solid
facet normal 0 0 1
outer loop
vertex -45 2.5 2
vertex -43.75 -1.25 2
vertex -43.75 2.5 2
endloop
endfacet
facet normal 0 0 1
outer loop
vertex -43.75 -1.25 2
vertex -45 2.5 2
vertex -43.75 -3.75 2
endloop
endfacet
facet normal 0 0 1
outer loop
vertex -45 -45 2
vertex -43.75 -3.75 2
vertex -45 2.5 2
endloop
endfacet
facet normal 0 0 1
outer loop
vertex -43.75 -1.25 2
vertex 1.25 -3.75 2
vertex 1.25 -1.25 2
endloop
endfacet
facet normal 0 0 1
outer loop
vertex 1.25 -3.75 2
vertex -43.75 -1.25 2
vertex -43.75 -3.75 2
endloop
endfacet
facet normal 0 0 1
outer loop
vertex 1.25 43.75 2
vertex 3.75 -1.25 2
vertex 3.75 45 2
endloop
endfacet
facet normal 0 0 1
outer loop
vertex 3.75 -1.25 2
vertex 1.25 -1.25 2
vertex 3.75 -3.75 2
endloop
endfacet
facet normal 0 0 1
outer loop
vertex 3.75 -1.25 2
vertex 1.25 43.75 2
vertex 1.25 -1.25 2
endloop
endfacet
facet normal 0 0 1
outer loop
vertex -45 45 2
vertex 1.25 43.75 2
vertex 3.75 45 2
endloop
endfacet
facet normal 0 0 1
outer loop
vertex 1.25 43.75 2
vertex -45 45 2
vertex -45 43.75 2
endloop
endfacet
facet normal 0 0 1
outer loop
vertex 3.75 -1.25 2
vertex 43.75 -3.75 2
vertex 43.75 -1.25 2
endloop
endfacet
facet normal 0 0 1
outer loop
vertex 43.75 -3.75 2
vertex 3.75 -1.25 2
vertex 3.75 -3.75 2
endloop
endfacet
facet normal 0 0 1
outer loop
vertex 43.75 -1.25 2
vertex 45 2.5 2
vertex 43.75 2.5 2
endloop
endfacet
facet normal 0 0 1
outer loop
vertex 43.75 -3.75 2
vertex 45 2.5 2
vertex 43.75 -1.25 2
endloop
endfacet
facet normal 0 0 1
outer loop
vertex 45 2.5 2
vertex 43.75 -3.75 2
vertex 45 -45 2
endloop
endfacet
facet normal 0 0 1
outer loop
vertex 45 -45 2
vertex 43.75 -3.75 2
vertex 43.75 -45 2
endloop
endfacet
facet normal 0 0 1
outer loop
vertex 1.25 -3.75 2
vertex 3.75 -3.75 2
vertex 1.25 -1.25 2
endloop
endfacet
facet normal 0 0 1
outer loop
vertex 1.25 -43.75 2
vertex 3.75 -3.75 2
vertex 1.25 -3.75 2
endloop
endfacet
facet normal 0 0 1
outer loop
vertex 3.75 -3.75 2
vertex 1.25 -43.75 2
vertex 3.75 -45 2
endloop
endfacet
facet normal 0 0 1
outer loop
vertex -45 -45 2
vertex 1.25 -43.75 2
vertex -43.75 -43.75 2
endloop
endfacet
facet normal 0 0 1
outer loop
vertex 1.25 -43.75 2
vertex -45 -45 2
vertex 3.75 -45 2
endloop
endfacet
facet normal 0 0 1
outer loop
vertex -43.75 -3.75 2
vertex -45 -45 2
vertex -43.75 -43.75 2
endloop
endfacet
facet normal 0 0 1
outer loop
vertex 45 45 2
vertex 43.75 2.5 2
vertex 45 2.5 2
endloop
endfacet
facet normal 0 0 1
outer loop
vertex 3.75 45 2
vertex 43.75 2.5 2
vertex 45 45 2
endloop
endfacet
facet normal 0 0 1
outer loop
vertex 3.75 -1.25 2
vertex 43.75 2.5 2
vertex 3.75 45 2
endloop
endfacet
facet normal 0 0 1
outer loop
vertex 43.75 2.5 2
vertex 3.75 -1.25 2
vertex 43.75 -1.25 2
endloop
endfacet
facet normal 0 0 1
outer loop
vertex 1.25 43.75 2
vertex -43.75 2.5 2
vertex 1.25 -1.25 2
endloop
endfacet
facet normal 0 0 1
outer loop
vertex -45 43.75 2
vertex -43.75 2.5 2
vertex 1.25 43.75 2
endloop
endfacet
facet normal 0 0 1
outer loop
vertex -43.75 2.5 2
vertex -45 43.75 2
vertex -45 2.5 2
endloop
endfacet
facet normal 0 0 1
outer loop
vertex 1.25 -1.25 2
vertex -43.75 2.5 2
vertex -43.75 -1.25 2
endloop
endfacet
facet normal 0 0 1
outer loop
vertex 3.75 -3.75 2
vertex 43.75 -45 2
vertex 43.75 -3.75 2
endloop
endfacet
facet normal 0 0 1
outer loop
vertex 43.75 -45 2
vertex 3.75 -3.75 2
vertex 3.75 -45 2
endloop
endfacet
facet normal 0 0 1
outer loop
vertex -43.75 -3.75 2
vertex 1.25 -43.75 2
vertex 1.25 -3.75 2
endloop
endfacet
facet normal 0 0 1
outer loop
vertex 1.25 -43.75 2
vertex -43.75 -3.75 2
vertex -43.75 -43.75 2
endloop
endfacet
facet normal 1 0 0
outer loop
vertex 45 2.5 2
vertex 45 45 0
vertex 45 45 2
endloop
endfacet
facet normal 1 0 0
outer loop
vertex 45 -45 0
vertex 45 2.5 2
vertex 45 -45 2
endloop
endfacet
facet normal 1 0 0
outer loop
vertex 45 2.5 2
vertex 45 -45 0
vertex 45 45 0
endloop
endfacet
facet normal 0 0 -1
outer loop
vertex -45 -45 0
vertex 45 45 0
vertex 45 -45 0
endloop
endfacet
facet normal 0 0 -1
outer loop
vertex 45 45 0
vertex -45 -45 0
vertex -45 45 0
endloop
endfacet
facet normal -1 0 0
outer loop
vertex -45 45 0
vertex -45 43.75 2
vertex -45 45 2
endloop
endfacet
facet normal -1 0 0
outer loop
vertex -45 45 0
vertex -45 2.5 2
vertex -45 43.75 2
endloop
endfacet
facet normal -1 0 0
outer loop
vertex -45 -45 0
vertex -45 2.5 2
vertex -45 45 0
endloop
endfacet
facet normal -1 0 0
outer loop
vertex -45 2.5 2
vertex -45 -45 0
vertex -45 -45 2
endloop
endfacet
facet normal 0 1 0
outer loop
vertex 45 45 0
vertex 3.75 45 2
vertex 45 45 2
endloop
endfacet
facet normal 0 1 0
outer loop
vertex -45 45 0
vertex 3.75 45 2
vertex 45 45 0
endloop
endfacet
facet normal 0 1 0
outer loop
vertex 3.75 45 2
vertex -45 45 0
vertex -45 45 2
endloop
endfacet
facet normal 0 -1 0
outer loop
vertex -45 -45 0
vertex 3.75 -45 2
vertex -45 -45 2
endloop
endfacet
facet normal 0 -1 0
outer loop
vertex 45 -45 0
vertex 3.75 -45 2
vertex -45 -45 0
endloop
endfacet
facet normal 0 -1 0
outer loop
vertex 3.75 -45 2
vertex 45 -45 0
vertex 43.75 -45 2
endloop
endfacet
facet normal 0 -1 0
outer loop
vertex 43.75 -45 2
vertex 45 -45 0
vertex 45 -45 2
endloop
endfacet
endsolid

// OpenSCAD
// Built by bench/smallmodels/features/compiler.py from a list of features.
$fn = 64;
difference() {
  union() {
    translate([0, 0, 0]) translate([-45, -45, 0]) cube([90, 90, 2]);
  }
  union() {
    translate([0, 0, -3.5]) rotate([0, 0, 0]) translate([-35.75, -35.75, 0]) cube([71.5, 71.5, 2]);
    translate([-42.5, -135, 2]) rotate([0, 0, 0]) translate([-45, -1.25, 0]) cube([90, 2.5, 40]);
    translate([-42.5, -45, 2]) rotate([0, 0, 0]) translate([-45, -1.25, 0]) cube([90, 2.5, 40]);
    translate([-42.5, 45, 2]) rotate([0, 0, 0]) translate([-45, -1.25, 0]) cube([90, 2.5, 40]);
    translate([-42.5, 135, 2]) rotate([0, 0, 0]) translate([-45, -1.25, 0]) cube([90, 2.5, 40]);
    translate([-135, -42.5, 2]) rotate([0, 0, 0]) translate([-1.25, -45, 0]) cube([2.5, 90, 40]);
    translate([-45, -42.5, 2]) rotate([0, 0, 0]) translate([-1.25, -45, 0]) cube([2.5, 90, 40]);
    translate([45, -42.5, 2]) rotate([0, 0, 0]) translate([-1.25, -45, 0]) cube([2.5, 90, 40]);
    translate([135, -42.5, 2]) rotate([0, 0, 0]) translate([-1.25, -45, 0]) cube([2.5, 90, 40]);
    translate([0, -92.5, 2]) rotate([0, 0, 0]) translate([-45, -1.25, 0]) cube([90, 2.5, 40]);
    translate([0, -2.5, 2]) rotate([0, 0, 0]) translate([-45, -1.25, 0]) cube([90, 2.5, 40]);
    translate([0, 87.5, 2]) rotate([0, 0, 0]) translate([-45, -1.25, 0]) cube([90, 2.5, 40]);
    translate([0, 177.5, 2]) rotate([0, 0, 0]) translate([-45, -1.25, 0]) cube([90, 2.5, 40]);
    translate([-177.5, 0, 2]) rotate([0, 0, 0]) translate([-1.25, -45, 0]) cube([2.5, 90, 40]);
    translate([-87.5, 0, 2]) rotate([0, 0, 0]) translate([-1.25, -45, 0]) cube([2.5, 90, 40]);
    translate([2.5, 0, 2]) rotate([0, 0, 0]) translate([-1.25, -45, 0]) cube([2.5, 90, 40]);
    translate([92.5, 0, 2]) rotate([0, 0, 0]) translate([-1.25, -45, 0]) cube([2.5, 90, 40]);
  }
}
